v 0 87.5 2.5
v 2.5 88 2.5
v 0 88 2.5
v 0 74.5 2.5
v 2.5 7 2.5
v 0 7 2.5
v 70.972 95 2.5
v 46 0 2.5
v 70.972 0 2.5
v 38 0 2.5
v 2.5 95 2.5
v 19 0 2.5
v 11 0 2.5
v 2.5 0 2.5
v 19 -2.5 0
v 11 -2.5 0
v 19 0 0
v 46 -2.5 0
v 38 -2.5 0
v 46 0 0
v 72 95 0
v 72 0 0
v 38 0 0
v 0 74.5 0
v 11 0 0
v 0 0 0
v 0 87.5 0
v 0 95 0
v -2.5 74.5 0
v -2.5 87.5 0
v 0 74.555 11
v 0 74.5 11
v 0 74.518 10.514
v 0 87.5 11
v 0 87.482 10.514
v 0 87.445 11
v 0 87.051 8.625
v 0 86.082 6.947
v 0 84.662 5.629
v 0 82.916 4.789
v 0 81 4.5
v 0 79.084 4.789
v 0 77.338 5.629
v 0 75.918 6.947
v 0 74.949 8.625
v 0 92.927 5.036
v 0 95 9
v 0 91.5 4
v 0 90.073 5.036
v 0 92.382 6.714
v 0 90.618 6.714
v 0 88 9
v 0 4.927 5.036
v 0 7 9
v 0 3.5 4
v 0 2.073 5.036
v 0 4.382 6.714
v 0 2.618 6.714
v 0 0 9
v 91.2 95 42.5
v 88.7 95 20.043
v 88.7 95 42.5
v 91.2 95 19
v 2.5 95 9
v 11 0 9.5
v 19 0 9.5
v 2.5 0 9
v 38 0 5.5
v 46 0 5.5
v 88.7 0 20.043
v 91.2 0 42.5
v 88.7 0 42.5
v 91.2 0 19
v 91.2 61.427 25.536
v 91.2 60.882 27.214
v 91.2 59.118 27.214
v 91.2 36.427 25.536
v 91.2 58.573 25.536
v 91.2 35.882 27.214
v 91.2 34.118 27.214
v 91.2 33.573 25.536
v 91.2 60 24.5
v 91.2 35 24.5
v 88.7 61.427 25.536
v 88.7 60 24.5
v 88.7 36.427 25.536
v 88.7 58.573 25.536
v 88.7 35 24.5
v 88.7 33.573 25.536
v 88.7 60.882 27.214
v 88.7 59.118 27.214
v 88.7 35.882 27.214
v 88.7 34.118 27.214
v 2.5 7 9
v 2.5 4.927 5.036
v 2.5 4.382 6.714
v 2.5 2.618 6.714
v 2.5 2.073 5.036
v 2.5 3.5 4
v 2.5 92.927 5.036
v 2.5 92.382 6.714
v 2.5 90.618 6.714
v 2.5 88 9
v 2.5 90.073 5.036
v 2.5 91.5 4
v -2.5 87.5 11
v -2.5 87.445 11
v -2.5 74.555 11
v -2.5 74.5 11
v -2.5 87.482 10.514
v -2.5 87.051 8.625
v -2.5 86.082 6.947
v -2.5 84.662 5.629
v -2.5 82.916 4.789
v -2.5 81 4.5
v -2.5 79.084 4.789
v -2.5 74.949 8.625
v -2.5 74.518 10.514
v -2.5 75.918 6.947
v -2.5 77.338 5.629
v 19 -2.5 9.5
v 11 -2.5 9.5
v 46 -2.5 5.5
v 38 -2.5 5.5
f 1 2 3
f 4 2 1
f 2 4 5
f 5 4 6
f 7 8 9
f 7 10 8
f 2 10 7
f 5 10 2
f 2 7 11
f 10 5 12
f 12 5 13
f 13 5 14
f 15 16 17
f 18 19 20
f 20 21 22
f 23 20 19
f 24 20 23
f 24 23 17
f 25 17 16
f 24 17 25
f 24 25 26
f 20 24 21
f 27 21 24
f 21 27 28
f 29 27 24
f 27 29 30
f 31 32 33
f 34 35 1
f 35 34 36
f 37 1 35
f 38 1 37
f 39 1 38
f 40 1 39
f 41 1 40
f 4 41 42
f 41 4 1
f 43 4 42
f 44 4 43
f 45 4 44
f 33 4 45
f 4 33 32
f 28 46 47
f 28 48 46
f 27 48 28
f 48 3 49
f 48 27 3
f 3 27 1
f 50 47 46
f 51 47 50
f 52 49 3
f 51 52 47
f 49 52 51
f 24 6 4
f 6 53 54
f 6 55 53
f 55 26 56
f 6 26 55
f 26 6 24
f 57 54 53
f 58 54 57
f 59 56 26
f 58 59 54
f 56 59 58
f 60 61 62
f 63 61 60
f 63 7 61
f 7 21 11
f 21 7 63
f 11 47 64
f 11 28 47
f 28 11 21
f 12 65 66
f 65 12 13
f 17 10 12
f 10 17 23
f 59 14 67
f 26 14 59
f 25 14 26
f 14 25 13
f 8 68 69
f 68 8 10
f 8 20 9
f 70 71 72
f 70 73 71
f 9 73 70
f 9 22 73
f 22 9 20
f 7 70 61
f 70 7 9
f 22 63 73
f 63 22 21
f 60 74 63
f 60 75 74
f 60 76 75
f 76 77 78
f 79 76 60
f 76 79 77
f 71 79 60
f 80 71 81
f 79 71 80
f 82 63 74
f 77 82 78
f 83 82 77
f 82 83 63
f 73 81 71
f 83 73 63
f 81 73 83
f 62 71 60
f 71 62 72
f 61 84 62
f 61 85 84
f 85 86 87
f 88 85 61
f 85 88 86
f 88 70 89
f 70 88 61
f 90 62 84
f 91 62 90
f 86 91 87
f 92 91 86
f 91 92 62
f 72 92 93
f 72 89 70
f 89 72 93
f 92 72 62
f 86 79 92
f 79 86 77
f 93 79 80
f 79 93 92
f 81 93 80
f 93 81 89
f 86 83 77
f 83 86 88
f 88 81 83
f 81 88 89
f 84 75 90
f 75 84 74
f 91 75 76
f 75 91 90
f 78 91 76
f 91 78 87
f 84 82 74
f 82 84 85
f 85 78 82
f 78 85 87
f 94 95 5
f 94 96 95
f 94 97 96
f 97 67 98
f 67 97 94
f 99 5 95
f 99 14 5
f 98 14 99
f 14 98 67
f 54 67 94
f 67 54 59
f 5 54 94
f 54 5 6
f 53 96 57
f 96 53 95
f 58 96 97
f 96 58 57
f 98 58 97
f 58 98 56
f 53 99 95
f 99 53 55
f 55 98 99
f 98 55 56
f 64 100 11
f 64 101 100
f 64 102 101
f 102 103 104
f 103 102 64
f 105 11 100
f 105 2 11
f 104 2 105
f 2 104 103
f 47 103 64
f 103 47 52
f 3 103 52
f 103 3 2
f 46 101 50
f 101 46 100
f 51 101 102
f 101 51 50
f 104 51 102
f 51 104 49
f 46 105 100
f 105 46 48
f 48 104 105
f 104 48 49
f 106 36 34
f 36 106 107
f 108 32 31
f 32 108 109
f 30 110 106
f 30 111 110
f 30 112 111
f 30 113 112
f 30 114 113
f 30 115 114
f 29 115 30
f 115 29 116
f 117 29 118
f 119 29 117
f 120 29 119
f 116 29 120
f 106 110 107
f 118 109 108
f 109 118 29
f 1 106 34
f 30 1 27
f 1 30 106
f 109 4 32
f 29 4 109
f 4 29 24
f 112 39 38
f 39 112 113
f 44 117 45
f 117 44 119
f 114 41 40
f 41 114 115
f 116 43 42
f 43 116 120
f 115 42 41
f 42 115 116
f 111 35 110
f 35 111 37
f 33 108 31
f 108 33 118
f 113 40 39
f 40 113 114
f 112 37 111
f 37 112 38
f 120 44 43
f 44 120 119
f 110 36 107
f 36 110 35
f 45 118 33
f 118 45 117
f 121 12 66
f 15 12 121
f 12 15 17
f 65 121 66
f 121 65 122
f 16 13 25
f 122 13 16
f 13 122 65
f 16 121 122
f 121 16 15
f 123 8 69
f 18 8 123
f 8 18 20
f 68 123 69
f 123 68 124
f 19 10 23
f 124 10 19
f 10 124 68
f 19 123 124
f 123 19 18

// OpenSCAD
w = 2.5;
dt = 1;
mistake = 1.5;


//       _________h1_____________
//      |                       | ___
//      |                      /   |
//   d1 |                     /    d2
//      |____________________/    _|_
//              h2
w1 = 93+2*w+2*dt;
w2 = w1 - 2*w;
h1 = 87.2+2*w+mistake;
d1 = 40+2*w;
h2 = 68+2*w+mistake;
d2 = 15+2*w-1;


dh =h1-h2;
alpha = atan(d2/dh);
l = sqrt(d2*d2+dh*dh);
difference()
{
    union()
    {
        cube([h2-w, w2, w]);
        translate([h2-w, 0, 0]) rotate([0, -alpha, 0]) 
        {
            cube([l,w2,w]);
            translate([l/2, w2/2, w+1]) rotate([0, 0, -90]) scale([ 1/2, 1/2, 1/128]) 
                #surface(file = "sig_bw.png", invert=true, center=true, convexity = 5);
        }
        translate([h1-2*w, 0, d2]) cube([w, w2, d1-d2-w]);
    }
        
     for (i=[35, w2-35])
         translate([h1-2*w, i, d2+7])
            rotate([0, 90, 0])  cylinder(h=w, d=3);
}   

// screws
for (i=[0, w2-7])
    translate([0, i, 0,])
        difference() 
        {
          cube([w, 7, 9]);
          translate([0, 3.5, 5.5]) rotate([0, 90, 0])  cylinder(h=w, d=3);
        }

//antenna
difference(){
    translate([-w, w2-(16-3+dt+(13/2)), 0]) cube([w, 13, 11]);        
    translate([-w, w2-(16-3+dt), 11]) rotate([0, 90, 0]) cylinder(h=w, d= 13);  
}    

// usb
translate([12+mistake-w, -w, 0]) cube([8, w, d1-w-37+4]);
translate([39+mistake-w, -w, 0]) cube([8, w, d1-w-37]);
